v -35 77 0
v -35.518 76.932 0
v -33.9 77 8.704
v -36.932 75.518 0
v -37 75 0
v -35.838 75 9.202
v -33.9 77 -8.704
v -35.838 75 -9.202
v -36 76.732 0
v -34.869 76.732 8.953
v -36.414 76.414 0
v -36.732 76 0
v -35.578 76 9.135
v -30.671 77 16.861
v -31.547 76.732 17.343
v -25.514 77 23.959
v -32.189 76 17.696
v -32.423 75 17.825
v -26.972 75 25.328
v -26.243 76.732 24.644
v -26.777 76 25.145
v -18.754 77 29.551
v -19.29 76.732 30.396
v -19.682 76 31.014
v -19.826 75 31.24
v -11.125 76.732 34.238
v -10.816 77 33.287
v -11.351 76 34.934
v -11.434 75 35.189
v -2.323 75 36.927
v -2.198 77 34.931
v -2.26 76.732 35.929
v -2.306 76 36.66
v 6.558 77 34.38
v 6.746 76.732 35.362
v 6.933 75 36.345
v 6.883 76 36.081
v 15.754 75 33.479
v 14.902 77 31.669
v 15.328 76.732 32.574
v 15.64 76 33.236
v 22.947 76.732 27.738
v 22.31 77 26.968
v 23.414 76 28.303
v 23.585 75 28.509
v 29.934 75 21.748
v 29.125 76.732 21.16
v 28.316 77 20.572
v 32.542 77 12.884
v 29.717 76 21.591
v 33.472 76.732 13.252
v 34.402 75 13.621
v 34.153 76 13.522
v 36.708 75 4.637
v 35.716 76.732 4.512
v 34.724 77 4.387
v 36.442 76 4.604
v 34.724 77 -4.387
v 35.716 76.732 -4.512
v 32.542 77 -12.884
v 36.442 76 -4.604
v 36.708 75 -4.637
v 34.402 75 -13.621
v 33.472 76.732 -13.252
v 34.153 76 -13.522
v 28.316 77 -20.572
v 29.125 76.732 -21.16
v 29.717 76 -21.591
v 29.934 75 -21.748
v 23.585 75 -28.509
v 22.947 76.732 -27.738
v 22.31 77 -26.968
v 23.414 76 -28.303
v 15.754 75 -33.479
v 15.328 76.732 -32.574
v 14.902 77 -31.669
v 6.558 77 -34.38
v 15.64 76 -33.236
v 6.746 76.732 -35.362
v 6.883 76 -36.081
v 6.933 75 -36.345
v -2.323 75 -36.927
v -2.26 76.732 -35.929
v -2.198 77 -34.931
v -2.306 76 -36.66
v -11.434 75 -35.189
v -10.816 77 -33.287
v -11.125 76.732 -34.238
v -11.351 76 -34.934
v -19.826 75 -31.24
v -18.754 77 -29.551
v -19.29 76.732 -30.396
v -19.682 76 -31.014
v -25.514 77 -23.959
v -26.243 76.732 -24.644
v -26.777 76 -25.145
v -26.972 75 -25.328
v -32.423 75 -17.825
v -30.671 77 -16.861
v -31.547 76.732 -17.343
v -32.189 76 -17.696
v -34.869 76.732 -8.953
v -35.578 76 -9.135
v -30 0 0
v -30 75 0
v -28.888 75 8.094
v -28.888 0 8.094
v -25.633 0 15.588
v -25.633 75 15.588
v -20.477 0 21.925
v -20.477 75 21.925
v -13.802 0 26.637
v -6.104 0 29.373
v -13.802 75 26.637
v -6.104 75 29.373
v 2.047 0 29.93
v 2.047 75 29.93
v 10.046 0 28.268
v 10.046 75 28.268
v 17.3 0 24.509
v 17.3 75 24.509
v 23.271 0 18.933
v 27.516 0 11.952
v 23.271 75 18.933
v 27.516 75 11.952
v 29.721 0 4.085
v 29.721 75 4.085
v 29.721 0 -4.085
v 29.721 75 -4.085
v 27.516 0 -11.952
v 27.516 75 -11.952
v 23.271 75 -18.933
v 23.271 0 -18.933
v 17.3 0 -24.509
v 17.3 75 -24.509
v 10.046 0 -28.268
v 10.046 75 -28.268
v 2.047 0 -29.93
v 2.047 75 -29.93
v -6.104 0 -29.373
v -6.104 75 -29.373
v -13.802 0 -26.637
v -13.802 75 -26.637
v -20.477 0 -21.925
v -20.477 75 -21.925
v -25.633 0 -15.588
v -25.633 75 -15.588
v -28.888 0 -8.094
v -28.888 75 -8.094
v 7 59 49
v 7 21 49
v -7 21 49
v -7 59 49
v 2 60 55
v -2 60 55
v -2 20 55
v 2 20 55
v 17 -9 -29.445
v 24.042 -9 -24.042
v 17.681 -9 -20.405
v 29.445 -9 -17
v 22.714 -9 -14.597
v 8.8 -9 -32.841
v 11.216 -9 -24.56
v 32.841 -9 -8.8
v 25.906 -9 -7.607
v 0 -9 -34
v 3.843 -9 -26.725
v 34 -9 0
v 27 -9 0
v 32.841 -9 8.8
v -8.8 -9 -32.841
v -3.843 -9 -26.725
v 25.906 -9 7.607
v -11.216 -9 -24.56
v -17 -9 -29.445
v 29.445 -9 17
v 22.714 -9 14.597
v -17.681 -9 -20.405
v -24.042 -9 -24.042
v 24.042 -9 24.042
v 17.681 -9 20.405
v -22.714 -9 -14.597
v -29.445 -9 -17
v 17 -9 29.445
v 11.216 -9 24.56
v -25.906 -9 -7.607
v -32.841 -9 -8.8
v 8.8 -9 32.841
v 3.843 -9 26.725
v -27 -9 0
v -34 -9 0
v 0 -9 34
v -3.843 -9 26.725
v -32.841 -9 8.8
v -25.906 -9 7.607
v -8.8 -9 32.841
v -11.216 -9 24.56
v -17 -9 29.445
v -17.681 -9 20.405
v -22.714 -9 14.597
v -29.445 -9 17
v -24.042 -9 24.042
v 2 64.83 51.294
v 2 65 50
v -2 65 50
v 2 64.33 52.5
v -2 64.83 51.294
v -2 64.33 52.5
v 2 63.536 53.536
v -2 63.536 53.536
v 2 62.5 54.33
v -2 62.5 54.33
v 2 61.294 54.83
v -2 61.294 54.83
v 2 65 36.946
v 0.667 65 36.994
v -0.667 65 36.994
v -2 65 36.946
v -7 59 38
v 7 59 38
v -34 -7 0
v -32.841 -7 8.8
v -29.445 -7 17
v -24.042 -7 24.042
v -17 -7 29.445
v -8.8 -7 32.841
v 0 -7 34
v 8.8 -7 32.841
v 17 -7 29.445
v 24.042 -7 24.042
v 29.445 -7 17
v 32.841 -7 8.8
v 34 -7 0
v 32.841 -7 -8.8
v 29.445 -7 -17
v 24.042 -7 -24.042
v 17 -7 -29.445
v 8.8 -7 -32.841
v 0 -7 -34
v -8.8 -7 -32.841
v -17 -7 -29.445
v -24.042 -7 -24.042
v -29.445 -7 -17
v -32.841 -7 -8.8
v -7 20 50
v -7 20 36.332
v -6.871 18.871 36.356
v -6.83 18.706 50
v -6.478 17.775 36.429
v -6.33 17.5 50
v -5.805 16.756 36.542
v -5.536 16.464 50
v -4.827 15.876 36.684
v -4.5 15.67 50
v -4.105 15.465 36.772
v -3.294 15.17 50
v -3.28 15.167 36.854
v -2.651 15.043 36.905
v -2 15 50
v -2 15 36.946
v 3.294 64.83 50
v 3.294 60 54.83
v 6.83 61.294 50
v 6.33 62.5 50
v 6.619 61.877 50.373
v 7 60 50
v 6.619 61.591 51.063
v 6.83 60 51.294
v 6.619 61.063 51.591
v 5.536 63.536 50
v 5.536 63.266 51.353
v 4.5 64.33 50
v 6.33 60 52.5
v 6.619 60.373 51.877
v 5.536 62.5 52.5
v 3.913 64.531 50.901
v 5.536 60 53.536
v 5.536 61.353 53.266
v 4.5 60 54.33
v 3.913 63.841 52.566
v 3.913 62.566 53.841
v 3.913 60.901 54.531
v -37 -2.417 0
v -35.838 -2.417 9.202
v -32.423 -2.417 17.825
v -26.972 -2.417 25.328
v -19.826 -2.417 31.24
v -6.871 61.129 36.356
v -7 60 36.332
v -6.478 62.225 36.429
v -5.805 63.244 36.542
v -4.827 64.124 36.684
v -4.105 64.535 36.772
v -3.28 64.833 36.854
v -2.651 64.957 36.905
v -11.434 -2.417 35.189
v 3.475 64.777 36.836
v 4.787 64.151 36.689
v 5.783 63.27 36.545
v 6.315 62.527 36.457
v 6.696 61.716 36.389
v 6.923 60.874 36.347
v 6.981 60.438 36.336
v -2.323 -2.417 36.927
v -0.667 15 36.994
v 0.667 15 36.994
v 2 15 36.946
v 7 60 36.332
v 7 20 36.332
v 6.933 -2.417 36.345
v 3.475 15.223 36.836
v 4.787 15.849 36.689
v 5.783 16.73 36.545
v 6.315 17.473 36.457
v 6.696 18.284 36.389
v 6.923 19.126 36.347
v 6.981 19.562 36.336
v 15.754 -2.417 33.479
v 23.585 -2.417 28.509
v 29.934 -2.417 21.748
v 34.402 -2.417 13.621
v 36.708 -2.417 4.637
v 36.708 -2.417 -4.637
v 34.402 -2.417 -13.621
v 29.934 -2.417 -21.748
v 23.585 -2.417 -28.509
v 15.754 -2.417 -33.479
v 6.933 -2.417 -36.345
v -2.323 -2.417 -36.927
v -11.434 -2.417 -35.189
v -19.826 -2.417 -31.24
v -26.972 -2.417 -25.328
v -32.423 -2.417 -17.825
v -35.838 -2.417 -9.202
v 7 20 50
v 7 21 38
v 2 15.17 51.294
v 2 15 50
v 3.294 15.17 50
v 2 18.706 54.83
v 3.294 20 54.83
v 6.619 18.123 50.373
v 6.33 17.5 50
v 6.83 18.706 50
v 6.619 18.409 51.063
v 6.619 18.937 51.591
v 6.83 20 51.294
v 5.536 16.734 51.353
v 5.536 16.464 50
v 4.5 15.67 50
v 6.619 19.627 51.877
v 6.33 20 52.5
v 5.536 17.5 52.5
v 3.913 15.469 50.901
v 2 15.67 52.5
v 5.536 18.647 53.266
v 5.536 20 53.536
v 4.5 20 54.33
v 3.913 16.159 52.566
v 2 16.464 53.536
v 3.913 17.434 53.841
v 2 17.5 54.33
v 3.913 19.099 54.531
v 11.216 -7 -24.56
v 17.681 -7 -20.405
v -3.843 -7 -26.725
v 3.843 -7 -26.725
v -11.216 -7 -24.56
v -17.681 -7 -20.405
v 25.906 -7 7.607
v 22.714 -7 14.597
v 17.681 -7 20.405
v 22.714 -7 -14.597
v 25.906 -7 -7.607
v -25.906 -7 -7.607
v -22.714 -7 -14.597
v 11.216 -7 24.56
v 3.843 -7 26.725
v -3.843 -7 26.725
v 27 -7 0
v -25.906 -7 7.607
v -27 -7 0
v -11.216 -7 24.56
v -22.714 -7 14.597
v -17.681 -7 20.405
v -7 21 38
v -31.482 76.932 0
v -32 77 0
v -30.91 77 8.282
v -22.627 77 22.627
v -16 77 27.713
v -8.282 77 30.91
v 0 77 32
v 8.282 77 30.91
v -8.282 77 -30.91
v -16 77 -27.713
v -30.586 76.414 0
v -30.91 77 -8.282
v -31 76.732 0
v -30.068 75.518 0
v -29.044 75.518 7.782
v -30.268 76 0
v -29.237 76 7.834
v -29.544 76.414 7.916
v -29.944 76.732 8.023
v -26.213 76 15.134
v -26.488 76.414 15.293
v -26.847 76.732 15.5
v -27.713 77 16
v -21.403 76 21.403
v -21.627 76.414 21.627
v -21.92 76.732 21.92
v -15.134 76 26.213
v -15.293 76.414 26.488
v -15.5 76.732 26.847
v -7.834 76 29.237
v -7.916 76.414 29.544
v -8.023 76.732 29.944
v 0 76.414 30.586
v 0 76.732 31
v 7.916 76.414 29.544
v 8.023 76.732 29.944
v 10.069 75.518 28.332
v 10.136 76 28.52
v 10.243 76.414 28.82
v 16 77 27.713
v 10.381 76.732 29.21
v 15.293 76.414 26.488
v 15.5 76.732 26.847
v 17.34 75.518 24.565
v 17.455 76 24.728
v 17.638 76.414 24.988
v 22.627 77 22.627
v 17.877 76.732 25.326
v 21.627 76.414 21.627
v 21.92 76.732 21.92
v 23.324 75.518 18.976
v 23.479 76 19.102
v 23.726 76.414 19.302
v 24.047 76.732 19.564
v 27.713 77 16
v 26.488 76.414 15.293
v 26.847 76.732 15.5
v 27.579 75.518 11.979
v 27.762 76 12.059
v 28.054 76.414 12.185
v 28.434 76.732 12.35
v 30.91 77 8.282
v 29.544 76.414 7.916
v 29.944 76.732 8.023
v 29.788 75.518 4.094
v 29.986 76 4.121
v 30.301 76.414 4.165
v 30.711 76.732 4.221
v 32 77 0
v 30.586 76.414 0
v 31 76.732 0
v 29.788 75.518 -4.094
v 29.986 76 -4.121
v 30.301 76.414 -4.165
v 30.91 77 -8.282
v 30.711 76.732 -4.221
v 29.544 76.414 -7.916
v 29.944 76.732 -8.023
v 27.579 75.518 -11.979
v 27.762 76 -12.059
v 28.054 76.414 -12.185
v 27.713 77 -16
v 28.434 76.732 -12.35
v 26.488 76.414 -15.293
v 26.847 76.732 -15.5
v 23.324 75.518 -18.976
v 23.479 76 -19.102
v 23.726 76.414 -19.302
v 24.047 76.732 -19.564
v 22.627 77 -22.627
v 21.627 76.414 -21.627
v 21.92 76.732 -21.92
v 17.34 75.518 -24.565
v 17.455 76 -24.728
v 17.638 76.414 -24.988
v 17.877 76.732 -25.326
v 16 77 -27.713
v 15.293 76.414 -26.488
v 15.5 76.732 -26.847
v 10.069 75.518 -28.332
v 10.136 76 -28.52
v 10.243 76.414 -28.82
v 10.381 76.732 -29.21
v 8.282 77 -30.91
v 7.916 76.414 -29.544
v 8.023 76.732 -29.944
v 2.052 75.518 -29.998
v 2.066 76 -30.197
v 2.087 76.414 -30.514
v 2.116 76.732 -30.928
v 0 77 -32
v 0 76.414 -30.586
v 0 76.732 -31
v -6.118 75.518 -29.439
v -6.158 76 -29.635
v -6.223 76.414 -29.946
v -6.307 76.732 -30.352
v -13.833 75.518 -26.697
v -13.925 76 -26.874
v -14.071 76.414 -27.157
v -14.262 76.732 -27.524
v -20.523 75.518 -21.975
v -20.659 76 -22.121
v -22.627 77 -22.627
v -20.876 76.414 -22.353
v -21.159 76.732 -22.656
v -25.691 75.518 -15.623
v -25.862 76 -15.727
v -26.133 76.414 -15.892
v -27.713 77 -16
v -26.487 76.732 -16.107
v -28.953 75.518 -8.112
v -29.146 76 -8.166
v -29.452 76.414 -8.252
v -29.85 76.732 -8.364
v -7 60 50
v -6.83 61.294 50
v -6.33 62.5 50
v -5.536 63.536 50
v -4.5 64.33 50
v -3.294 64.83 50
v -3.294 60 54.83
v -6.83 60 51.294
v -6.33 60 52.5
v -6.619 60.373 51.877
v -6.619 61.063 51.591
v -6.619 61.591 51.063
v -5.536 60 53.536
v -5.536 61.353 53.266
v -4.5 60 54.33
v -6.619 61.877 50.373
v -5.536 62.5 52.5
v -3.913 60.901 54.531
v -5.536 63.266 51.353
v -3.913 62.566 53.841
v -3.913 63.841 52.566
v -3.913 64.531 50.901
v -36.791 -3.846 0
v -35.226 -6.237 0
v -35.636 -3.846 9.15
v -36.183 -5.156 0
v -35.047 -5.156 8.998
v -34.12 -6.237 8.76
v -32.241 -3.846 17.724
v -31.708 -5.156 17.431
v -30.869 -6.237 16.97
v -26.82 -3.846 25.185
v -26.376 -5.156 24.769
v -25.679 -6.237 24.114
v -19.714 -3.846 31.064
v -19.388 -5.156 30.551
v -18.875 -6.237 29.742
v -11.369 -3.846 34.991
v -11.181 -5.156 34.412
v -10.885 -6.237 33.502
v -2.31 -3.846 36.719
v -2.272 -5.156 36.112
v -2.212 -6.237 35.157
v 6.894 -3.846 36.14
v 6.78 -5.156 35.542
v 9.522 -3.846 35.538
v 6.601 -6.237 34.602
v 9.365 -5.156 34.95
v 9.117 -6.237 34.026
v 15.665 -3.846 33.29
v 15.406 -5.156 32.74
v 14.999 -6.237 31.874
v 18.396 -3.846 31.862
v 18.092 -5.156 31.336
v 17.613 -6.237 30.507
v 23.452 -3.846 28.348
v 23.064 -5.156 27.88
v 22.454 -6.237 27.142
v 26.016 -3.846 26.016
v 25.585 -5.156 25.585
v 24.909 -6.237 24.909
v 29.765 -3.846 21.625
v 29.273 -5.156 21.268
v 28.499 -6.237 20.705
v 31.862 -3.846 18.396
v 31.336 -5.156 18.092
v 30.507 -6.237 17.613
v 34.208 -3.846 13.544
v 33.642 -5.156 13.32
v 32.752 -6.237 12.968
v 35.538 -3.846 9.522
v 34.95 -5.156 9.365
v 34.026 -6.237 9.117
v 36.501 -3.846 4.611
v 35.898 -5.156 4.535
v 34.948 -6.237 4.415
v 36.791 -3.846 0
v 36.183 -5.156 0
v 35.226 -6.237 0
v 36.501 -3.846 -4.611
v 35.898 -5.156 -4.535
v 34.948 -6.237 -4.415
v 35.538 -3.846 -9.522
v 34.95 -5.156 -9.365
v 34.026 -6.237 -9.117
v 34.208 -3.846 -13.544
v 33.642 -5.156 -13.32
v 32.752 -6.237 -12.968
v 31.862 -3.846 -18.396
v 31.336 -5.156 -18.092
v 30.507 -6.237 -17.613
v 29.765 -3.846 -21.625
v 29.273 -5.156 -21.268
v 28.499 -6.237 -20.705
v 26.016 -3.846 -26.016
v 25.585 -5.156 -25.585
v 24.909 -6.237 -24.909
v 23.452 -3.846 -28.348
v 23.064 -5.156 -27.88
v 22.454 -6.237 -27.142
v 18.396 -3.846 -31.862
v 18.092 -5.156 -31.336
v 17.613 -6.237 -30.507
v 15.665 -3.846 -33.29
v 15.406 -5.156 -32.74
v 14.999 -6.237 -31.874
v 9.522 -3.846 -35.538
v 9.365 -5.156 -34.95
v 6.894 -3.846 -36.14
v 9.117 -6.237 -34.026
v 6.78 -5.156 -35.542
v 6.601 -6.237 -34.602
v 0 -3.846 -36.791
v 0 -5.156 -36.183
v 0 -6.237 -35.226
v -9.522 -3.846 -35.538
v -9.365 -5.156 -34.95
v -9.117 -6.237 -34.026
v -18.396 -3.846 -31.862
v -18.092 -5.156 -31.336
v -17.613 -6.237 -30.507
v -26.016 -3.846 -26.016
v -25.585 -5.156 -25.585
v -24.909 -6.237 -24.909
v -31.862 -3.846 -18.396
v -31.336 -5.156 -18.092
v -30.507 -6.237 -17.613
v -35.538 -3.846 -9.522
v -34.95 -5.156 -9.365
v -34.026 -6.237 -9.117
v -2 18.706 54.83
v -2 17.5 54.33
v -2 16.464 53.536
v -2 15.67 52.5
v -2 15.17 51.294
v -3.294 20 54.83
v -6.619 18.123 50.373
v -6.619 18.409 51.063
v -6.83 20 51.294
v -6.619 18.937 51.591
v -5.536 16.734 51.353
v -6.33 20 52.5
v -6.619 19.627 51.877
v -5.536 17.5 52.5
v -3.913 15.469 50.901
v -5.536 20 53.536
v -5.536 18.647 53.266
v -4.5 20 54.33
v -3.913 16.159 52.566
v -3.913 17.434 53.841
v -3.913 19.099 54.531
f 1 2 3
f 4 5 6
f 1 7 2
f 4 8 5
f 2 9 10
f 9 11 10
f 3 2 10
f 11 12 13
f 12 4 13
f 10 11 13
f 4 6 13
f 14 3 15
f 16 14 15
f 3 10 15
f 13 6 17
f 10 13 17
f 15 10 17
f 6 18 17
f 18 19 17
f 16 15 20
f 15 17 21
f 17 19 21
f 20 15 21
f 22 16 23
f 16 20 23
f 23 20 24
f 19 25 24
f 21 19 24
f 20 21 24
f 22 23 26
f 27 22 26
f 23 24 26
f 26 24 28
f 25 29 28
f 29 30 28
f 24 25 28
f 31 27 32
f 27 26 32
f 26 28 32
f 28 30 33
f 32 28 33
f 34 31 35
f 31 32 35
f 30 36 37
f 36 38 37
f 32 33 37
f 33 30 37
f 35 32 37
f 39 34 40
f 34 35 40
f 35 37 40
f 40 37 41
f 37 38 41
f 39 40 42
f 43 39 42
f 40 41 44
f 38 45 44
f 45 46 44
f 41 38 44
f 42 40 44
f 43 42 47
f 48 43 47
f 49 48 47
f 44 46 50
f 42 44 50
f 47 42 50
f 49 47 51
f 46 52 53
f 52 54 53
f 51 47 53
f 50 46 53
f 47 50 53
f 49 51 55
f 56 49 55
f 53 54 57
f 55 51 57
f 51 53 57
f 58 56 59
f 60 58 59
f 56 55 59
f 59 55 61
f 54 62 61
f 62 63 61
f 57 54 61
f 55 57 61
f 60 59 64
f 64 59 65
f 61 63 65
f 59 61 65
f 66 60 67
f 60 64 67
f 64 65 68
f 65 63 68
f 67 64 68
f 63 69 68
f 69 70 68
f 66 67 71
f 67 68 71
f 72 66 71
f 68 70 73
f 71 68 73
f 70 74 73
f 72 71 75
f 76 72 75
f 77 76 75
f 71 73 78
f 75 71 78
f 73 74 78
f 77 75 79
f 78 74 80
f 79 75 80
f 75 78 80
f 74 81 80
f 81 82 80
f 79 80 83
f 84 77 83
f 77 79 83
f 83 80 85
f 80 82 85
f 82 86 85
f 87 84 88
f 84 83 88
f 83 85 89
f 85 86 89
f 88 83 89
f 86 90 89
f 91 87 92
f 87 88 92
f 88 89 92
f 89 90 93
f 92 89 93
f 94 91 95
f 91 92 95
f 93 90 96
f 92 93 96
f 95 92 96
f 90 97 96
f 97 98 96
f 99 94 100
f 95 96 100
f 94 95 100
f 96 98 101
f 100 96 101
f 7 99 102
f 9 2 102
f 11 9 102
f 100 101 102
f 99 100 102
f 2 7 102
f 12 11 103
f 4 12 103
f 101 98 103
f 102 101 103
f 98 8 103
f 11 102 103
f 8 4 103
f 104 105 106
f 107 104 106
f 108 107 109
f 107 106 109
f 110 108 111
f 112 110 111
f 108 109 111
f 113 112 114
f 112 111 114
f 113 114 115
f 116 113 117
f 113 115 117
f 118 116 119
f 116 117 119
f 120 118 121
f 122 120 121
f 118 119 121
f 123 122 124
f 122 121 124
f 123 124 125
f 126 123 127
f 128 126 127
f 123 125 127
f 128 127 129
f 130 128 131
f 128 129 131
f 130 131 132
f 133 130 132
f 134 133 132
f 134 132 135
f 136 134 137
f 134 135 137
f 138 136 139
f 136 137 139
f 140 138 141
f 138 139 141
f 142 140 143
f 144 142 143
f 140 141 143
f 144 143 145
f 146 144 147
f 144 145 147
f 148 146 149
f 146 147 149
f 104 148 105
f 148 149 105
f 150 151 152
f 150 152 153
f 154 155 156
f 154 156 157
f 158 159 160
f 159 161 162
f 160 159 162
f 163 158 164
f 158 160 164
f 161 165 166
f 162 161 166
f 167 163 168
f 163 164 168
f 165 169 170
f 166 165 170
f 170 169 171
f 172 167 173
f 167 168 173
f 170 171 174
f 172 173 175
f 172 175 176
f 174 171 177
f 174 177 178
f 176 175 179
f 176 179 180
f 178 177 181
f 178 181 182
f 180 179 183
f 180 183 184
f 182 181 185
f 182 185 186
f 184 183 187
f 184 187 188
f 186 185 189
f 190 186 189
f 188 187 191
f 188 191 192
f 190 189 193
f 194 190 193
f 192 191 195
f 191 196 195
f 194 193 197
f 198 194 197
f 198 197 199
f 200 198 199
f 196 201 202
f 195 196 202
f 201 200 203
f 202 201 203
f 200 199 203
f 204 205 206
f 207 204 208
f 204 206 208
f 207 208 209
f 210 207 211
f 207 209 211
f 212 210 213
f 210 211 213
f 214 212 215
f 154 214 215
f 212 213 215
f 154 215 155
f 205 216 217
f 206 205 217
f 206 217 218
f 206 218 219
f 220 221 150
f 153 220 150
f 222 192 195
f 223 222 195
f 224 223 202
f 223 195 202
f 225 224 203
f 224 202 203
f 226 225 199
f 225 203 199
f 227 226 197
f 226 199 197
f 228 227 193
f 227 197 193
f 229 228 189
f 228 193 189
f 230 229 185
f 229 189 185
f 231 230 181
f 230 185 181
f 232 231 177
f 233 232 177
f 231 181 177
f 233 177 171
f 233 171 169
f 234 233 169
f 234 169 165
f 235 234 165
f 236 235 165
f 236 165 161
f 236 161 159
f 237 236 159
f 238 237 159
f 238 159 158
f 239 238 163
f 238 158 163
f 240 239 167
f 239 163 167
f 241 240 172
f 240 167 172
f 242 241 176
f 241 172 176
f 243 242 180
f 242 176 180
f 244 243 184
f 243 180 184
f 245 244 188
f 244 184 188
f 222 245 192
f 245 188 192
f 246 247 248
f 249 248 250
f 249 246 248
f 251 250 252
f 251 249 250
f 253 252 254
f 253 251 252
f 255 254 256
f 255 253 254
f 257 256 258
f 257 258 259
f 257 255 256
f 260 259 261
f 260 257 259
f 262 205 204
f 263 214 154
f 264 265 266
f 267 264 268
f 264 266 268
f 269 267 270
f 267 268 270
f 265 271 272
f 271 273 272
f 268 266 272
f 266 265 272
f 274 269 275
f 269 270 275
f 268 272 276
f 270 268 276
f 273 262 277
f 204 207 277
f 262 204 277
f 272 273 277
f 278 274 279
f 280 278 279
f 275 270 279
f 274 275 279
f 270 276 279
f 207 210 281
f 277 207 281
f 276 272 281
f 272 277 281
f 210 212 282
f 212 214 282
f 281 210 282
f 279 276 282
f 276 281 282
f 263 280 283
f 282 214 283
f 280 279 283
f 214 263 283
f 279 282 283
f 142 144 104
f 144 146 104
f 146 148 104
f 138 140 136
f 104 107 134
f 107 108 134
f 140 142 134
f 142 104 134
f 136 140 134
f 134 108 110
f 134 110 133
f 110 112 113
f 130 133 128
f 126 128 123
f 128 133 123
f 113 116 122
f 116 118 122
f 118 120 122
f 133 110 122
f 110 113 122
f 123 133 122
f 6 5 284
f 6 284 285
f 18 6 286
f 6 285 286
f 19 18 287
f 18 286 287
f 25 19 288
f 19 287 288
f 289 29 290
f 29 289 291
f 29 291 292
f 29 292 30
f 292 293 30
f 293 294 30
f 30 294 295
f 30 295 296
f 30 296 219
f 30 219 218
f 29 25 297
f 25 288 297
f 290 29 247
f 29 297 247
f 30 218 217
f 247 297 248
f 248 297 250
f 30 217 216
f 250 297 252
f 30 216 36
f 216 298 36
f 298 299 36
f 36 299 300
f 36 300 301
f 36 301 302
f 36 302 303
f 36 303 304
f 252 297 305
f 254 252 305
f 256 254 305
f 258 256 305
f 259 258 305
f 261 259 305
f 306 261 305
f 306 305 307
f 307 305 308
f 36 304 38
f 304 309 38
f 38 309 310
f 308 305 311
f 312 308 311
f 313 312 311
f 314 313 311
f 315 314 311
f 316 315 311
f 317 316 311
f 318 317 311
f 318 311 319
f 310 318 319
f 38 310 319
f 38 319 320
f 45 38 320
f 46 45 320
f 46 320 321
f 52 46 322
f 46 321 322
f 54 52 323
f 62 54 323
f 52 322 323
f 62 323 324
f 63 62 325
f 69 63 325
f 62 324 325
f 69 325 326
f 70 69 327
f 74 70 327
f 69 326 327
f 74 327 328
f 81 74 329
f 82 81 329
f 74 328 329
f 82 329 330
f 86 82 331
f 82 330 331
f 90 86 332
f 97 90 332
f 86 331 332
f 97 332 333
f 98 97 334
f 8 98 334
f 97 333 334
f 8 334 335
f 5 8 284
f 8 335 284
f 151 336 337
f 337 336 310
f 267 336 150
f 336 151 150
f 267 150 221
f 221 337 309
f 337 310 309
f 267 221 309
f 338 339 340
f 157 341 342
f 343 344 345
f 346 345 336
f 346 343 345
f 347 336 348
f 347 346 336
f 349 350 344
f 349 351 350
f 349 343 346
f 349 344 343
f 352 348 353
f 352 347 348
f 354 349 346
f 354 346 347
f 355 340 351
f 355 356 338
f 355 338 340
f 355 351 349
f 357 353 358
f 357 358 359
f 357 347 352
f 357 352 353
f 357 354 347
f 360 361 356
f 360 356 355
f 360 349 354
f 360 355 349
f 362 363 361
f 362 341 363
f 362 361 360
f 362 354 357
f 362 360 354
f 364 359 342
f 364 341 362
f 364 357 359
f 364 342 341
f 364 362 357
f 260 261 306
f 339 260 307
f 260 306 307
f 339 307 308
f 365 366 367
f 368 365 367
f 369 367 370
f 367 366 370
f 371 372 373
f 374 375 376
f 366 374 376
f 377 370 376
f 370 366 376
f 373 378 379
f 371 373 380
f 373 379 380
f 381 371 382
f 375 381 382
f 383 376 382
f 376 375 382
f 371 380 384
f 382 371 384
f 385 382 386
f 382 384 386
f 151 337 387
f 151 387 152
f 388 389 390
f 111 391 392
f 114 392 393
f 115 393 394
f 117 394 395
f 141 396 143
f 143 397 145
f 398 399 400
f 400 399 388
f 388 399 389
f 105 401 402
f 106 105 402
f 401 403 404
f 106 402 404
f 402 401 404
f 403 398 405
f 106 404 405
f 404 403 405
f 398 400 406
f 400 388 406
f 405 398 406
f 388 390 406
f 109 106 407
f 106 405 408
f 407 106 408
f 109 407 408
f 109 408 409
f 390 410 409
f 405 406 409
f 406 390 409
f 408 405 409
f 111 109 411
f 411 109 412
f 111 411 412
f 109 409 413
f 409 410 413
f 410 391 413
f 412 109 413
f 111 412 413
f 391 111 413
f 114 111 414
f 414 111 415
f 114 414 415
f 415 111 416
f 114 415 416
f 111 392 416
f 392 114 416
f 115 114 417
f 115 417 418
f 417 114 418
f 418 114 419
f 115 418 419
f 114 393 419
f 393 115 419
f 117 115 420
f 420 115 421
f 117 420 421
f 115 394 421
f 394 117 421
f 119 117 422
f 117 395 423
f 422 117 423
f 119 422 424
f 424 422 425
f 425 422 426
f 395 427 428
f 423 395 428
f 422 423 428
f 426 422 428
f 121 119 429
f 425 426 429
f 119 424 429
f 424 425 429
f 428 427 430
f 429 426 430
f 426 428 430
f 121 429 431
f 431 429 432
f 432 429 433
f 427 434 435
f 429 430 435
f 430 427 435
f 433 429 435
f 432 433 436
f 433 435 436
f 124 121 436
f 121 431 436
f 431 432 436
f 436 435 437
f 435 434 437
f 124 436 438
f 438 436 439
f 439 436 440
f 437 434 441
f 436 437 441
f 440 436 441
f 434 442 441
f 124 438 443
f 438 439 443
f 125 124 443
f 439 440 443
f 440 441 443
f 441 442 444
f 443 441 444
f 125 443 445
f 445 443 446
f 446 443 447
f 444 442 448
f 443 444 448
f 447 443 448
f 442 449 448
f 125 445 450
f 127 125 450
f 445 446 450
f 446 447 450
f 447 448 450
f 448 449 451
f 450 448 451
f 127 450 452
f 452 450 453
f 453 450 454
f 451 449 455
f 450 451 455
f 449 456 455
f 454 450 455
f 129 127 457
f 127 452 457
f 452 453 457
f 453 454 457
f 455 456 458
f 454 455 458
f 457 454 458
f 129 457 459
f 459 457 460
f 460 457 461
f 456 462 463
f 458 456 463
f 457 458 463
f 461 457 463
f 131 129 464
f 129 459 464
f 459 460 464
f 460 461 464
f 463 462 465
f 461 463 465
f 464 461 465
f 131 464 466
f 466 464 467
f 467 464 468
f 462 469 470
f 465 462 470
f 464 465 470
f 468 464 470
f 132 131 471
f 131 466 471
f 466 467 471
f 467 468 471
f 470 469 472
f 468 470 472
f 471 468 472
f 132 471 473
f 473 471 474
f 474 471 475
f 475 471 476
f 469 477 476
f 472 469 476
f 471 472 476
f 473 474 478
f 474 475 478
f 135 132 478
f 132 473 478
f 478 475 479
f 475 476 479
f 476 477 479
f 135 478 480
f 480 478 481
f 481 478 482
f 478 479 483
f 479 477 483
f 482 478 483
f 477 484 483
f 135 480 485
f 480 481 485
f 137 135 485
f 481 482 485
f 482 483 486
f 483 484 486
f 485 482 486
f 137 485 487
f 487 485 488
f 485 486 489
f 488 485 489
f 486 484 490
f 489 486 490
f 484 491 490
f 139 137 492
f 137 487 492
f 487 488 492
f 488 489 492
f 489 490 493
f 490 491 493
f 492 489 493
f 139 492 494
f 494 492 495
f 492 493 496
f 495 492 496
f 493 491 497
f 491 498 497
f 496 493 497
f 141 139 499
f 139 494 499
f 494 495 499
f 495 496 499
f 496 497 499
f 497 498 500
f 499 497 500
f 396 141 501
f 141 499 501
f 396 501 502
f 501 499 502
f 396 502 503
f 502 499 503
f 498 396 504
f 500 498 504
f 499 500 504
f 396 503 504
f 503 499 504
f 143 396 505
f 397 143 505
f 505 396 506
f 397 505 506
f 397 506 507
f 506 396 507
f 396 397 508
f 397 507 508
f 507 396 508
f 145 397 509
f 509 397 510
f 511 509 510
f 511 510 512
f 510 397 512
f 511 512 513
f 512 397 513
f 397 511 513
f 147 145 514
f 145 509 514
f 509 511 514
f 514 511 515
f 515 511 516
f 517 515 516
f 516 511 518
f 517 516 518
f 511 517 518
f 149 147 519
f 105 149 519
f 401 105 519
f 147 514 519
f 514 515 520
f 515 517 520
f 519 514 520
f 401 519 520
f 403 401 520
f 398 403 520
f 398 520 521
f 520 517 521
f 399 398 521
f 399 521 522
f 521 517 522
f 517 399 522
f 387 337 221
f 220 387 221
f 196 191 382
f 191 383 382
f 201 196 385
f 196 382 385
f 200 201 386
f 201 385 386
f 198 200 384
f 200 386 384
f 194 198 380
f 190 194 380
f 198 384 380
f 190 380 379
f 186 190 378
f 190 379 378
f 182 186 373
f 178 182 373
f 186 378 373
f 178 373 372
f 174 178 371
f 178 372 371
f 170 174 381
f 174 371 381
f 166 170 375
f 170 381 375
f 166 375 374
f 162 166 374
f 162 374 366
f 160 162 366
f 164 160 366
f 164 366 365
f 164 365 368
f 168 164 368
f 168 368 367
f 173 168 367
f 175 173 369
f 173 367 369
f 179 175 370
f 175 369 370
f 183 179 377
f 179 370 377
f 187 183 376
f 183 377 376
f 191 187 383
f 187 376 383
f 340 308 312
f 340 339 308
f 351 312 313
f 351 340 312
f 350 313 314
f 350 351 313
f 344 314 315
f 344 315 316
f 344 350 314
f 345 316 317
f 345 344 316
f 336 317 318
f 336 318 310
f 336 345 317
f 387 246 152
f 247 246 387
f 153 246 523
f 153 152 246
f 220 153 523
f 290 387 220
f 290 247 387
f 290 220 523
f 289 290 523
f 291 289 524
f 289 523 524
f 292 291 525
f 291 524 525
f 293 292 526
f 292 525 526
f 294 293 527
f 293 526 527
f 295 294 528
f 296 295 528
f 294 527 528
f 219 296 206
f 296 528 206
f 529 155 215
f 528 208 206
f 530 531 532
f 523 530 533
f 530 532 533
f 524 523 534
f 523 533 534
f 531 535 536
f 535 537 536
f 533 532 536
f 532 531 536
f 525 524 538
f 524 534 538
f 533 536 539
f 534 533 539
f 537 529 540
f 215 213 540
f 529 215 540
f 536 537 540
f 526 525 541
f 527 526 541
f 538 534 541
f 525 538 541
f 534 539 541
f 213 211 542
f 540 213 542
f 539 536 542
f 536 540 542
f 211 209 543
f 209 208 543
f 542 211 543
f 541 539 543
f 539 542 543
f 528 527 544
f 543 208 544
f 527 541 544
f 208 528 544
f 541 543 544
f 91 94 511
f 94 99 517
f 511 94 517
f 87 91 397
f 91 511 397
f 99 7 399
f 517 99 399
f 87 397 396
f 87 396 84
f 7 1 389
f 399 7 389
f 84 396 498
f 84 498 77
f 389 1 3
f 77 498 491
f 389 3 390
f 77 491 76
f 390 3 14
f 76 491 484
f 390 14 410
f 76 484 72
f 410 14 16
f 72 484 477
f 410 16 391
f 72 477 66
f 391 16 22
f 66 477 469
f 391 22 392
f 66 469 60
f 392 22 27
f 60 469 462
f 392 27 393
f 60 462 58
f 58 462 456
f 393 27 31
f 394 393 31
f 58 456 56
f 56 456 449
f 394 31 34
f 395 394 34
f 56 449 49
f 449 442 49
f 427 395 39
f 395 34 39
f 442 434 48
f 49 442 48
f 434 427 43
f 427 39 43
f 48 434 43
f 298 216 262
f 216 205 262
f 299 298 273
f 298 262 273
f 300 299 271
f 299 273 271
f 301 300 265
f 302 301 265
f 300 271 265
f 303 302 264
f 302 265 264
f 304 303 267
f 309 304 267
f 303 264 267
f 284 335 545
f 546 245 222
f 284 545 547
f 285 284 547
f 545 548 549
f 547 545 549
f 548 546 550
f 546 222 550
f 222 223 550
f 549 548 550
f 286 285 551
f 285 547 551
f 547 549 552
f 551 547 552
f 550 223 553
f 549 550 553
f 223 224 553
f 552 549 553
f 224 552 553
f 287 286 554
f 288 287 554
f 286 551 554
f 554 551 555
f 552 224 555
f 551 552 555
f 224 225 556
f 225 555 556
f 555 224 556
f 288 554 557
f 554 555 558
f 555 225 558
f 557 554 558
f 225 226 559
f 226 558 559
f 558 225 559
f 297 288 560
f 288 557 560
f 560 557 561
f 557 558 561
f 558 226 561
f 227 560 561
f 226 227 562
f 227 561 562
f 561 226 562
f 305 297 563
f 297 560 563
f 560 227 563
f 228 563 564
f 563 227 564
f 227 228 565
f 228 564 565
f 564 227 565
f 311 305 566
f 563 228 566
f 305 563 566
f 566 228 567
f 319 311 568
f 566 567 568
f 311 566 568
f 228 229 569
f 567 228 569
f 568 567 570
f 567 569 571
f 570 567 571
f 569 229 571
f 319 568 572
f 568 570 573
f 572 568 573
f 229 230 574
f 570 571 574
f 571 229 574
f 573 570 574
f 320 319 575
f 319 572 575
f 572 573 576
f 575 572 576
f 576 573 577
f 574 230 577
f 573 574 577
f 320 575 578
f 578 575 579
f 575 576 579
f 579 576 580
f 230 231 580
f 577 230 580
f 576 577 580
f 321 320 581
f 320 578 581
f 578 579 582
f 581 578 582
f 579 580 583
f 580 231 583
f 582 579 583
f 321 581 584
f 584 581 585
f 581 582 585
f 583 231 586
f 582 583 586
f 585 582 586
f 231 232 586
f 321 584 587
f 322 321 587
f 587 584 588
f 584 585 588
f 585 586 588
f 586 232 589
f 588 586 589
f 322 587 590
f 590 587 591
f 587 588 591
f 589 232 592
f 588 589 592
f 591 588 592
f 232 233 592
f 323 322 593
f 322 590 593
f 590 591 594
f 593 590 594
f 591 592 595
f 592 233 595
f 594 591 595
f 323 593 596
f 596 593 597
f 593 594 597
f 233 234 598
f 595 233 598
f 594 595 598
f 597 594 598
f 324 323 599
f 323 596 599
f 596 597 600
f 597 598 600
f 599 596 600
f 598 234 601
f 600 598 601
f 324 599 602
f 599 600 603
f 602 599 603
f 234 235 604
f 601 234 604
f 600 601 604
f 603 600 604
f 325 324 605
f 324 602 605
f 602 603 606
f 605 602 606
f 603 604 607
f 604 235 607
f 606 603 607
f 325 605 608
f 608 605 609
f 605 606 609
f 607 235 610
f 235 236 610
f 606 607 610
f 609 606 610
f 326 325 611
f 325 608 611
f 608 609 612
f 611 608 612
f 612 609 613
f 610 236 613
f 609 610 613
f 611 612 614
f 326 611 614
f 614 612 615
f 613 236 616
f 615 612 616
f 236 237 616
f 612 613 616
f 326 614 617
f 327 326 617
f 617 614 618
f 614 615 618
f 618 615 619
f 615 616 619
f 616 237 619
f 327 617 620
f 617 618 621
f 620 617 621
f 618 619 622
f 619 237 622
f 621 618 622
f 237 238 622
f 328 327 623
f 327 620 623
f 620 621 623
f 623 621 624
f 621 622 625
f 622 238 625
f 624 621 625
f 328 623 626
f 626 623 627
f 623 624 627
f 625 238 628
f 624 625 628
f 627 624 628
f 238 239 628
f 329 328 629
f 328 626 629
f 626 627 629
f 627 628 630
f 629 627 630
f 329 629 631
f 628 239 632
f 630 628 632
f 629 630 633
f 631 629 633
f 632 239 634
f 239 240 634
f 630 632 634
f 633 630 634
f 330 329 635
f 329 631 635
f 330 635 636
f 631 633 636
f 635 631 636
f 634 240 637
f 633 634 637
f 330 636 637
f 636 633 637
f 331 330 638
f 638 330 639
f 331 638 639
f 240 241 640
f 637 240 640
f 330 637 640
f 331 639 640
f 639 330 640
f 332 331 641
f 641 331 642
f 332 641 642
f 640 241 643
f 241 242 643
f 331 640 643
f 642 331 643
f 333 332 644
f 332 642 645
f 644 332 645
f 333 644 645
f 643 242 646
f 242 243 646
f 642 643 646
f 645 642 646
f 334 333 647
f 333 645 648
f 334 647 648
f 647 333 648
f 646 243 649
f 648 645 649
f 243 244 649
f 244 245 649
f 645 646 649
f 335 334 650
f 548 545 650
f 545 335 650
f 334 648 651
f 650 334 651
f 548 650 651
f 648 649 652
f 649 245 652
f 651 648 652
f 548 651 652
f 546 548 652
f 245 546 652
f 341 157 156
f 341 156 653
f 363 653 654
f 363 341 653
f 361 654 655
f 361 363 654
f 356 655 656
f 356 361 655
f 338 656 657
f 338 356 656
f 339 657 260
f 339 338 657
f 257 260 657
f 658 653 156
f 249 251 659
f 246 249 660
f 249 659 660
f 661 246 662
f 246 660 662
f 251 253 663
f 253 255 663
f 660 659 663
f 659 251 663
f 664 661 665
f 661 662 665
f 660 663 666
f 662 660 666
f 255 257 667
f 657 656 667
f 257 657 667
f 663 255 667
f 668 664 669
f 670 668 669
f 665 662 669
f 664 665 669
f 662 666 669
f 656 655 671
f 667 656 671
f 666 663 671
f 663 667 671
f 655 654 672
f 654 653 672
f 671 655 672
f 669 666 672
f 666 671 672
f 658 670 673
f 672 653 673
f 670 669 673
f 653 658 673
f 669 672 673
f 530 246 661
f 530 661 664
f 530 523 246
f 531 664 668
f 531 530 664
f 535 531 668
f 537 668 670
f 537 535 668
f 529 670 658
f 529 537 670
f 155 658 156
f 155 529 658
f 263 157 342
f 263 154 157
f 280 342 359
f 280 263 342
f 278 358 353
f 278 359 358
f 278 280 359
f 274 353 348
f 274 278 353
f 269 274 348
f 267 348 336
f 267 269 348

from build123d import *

# Parameters (mm, degrees)
F2_R     = 2
F5_W     = 7
F5_H     = 50
F6_DEPTH = 20
F8_R     = 5
F7_W     = 38
F7_H     = 11
F9_DEPTH = 25


# Not quite as in the source:
# - a fillet or chamfer that OpenCascade refuses, or shapes differently, is made with other operations: its cross-section is extruded or revolved along the edge and cut away or added
# - two fillets or chamfers of one size are made in one step


with BuildPart() as f1:
    # F0 (on Top) → F1 (revolve)
    with BuildSketch(Plane.XY):
        Polygon((0, -7), (0, 0), (-30, 0), (-30, 77), (-37, 77), (-37, -7), (-34, -7), (-34, -9), (-27, -9), (-27, -7), align=None)
    revolve(axis=Axis((0, 38.5, 0), (0, 1, 0)))

    # F2
    f2_edges = [f1.edges().sort_by_distance(p)[0] for p in [
        (37, 77, 0),
        (30, 77, 0),
    ]]
    fillet(f2_edges, radius=F2_R)

    # F3: fillet of radius 5 on 1 edges, made by hand

    # F3_s1 → F3_t2 (revolve, cut)
    with BuildSketch(Plane.XY):
        with BuildLine():
            ThreePointArc((-37, -2.417424305), (-36.1833001327, -5.1560370926), (-34, -7))
            Line((-34, -7), (-37, -7))
            Line((-37, -7), (-37, -2.417424305))
        make_face()
    revolve(axis=Axis((0, -7, 0), (0, 1, 0)), mode=Mode.SUBTRACT)

    # F5 (on offset) → F6 (join)
    with BuildSketch(Plane.XY.offset(35)):
        with Locations((-3.5, 40)):
            Rectangle(F5_W, F5_H)
        with Locations((3.5, 40)):
            Rectangle(F5_W, F5_H)
    extrude(amount=F6_DEPTH)

    # F8
    f8_edges = [f1.edges().sort_by_distance(p)[0] for p in [
        (0, 65, 55),
        (0, 15, 55),
        (7, 15, 45.665902),
        (-7, 15, 45.665902),
        (-7, 40, 55),
        (-7, 65, 45.665902),
        (7, 65, 45.665902),
        (7, 40, 55),
    ]]
    fillet(f8_edges, radius=F8_R)

    # F7 (on face) → F9 (cut)
    with BuildSketch(Plane.YZ.offset(7)):
        with Locations((40, 43.5)):
            Rectangle(F7_W, F7_H)
    extrude(amount=-F9_DEPTH, mode=Mode.SUBTRACT)


solid = f1.part
